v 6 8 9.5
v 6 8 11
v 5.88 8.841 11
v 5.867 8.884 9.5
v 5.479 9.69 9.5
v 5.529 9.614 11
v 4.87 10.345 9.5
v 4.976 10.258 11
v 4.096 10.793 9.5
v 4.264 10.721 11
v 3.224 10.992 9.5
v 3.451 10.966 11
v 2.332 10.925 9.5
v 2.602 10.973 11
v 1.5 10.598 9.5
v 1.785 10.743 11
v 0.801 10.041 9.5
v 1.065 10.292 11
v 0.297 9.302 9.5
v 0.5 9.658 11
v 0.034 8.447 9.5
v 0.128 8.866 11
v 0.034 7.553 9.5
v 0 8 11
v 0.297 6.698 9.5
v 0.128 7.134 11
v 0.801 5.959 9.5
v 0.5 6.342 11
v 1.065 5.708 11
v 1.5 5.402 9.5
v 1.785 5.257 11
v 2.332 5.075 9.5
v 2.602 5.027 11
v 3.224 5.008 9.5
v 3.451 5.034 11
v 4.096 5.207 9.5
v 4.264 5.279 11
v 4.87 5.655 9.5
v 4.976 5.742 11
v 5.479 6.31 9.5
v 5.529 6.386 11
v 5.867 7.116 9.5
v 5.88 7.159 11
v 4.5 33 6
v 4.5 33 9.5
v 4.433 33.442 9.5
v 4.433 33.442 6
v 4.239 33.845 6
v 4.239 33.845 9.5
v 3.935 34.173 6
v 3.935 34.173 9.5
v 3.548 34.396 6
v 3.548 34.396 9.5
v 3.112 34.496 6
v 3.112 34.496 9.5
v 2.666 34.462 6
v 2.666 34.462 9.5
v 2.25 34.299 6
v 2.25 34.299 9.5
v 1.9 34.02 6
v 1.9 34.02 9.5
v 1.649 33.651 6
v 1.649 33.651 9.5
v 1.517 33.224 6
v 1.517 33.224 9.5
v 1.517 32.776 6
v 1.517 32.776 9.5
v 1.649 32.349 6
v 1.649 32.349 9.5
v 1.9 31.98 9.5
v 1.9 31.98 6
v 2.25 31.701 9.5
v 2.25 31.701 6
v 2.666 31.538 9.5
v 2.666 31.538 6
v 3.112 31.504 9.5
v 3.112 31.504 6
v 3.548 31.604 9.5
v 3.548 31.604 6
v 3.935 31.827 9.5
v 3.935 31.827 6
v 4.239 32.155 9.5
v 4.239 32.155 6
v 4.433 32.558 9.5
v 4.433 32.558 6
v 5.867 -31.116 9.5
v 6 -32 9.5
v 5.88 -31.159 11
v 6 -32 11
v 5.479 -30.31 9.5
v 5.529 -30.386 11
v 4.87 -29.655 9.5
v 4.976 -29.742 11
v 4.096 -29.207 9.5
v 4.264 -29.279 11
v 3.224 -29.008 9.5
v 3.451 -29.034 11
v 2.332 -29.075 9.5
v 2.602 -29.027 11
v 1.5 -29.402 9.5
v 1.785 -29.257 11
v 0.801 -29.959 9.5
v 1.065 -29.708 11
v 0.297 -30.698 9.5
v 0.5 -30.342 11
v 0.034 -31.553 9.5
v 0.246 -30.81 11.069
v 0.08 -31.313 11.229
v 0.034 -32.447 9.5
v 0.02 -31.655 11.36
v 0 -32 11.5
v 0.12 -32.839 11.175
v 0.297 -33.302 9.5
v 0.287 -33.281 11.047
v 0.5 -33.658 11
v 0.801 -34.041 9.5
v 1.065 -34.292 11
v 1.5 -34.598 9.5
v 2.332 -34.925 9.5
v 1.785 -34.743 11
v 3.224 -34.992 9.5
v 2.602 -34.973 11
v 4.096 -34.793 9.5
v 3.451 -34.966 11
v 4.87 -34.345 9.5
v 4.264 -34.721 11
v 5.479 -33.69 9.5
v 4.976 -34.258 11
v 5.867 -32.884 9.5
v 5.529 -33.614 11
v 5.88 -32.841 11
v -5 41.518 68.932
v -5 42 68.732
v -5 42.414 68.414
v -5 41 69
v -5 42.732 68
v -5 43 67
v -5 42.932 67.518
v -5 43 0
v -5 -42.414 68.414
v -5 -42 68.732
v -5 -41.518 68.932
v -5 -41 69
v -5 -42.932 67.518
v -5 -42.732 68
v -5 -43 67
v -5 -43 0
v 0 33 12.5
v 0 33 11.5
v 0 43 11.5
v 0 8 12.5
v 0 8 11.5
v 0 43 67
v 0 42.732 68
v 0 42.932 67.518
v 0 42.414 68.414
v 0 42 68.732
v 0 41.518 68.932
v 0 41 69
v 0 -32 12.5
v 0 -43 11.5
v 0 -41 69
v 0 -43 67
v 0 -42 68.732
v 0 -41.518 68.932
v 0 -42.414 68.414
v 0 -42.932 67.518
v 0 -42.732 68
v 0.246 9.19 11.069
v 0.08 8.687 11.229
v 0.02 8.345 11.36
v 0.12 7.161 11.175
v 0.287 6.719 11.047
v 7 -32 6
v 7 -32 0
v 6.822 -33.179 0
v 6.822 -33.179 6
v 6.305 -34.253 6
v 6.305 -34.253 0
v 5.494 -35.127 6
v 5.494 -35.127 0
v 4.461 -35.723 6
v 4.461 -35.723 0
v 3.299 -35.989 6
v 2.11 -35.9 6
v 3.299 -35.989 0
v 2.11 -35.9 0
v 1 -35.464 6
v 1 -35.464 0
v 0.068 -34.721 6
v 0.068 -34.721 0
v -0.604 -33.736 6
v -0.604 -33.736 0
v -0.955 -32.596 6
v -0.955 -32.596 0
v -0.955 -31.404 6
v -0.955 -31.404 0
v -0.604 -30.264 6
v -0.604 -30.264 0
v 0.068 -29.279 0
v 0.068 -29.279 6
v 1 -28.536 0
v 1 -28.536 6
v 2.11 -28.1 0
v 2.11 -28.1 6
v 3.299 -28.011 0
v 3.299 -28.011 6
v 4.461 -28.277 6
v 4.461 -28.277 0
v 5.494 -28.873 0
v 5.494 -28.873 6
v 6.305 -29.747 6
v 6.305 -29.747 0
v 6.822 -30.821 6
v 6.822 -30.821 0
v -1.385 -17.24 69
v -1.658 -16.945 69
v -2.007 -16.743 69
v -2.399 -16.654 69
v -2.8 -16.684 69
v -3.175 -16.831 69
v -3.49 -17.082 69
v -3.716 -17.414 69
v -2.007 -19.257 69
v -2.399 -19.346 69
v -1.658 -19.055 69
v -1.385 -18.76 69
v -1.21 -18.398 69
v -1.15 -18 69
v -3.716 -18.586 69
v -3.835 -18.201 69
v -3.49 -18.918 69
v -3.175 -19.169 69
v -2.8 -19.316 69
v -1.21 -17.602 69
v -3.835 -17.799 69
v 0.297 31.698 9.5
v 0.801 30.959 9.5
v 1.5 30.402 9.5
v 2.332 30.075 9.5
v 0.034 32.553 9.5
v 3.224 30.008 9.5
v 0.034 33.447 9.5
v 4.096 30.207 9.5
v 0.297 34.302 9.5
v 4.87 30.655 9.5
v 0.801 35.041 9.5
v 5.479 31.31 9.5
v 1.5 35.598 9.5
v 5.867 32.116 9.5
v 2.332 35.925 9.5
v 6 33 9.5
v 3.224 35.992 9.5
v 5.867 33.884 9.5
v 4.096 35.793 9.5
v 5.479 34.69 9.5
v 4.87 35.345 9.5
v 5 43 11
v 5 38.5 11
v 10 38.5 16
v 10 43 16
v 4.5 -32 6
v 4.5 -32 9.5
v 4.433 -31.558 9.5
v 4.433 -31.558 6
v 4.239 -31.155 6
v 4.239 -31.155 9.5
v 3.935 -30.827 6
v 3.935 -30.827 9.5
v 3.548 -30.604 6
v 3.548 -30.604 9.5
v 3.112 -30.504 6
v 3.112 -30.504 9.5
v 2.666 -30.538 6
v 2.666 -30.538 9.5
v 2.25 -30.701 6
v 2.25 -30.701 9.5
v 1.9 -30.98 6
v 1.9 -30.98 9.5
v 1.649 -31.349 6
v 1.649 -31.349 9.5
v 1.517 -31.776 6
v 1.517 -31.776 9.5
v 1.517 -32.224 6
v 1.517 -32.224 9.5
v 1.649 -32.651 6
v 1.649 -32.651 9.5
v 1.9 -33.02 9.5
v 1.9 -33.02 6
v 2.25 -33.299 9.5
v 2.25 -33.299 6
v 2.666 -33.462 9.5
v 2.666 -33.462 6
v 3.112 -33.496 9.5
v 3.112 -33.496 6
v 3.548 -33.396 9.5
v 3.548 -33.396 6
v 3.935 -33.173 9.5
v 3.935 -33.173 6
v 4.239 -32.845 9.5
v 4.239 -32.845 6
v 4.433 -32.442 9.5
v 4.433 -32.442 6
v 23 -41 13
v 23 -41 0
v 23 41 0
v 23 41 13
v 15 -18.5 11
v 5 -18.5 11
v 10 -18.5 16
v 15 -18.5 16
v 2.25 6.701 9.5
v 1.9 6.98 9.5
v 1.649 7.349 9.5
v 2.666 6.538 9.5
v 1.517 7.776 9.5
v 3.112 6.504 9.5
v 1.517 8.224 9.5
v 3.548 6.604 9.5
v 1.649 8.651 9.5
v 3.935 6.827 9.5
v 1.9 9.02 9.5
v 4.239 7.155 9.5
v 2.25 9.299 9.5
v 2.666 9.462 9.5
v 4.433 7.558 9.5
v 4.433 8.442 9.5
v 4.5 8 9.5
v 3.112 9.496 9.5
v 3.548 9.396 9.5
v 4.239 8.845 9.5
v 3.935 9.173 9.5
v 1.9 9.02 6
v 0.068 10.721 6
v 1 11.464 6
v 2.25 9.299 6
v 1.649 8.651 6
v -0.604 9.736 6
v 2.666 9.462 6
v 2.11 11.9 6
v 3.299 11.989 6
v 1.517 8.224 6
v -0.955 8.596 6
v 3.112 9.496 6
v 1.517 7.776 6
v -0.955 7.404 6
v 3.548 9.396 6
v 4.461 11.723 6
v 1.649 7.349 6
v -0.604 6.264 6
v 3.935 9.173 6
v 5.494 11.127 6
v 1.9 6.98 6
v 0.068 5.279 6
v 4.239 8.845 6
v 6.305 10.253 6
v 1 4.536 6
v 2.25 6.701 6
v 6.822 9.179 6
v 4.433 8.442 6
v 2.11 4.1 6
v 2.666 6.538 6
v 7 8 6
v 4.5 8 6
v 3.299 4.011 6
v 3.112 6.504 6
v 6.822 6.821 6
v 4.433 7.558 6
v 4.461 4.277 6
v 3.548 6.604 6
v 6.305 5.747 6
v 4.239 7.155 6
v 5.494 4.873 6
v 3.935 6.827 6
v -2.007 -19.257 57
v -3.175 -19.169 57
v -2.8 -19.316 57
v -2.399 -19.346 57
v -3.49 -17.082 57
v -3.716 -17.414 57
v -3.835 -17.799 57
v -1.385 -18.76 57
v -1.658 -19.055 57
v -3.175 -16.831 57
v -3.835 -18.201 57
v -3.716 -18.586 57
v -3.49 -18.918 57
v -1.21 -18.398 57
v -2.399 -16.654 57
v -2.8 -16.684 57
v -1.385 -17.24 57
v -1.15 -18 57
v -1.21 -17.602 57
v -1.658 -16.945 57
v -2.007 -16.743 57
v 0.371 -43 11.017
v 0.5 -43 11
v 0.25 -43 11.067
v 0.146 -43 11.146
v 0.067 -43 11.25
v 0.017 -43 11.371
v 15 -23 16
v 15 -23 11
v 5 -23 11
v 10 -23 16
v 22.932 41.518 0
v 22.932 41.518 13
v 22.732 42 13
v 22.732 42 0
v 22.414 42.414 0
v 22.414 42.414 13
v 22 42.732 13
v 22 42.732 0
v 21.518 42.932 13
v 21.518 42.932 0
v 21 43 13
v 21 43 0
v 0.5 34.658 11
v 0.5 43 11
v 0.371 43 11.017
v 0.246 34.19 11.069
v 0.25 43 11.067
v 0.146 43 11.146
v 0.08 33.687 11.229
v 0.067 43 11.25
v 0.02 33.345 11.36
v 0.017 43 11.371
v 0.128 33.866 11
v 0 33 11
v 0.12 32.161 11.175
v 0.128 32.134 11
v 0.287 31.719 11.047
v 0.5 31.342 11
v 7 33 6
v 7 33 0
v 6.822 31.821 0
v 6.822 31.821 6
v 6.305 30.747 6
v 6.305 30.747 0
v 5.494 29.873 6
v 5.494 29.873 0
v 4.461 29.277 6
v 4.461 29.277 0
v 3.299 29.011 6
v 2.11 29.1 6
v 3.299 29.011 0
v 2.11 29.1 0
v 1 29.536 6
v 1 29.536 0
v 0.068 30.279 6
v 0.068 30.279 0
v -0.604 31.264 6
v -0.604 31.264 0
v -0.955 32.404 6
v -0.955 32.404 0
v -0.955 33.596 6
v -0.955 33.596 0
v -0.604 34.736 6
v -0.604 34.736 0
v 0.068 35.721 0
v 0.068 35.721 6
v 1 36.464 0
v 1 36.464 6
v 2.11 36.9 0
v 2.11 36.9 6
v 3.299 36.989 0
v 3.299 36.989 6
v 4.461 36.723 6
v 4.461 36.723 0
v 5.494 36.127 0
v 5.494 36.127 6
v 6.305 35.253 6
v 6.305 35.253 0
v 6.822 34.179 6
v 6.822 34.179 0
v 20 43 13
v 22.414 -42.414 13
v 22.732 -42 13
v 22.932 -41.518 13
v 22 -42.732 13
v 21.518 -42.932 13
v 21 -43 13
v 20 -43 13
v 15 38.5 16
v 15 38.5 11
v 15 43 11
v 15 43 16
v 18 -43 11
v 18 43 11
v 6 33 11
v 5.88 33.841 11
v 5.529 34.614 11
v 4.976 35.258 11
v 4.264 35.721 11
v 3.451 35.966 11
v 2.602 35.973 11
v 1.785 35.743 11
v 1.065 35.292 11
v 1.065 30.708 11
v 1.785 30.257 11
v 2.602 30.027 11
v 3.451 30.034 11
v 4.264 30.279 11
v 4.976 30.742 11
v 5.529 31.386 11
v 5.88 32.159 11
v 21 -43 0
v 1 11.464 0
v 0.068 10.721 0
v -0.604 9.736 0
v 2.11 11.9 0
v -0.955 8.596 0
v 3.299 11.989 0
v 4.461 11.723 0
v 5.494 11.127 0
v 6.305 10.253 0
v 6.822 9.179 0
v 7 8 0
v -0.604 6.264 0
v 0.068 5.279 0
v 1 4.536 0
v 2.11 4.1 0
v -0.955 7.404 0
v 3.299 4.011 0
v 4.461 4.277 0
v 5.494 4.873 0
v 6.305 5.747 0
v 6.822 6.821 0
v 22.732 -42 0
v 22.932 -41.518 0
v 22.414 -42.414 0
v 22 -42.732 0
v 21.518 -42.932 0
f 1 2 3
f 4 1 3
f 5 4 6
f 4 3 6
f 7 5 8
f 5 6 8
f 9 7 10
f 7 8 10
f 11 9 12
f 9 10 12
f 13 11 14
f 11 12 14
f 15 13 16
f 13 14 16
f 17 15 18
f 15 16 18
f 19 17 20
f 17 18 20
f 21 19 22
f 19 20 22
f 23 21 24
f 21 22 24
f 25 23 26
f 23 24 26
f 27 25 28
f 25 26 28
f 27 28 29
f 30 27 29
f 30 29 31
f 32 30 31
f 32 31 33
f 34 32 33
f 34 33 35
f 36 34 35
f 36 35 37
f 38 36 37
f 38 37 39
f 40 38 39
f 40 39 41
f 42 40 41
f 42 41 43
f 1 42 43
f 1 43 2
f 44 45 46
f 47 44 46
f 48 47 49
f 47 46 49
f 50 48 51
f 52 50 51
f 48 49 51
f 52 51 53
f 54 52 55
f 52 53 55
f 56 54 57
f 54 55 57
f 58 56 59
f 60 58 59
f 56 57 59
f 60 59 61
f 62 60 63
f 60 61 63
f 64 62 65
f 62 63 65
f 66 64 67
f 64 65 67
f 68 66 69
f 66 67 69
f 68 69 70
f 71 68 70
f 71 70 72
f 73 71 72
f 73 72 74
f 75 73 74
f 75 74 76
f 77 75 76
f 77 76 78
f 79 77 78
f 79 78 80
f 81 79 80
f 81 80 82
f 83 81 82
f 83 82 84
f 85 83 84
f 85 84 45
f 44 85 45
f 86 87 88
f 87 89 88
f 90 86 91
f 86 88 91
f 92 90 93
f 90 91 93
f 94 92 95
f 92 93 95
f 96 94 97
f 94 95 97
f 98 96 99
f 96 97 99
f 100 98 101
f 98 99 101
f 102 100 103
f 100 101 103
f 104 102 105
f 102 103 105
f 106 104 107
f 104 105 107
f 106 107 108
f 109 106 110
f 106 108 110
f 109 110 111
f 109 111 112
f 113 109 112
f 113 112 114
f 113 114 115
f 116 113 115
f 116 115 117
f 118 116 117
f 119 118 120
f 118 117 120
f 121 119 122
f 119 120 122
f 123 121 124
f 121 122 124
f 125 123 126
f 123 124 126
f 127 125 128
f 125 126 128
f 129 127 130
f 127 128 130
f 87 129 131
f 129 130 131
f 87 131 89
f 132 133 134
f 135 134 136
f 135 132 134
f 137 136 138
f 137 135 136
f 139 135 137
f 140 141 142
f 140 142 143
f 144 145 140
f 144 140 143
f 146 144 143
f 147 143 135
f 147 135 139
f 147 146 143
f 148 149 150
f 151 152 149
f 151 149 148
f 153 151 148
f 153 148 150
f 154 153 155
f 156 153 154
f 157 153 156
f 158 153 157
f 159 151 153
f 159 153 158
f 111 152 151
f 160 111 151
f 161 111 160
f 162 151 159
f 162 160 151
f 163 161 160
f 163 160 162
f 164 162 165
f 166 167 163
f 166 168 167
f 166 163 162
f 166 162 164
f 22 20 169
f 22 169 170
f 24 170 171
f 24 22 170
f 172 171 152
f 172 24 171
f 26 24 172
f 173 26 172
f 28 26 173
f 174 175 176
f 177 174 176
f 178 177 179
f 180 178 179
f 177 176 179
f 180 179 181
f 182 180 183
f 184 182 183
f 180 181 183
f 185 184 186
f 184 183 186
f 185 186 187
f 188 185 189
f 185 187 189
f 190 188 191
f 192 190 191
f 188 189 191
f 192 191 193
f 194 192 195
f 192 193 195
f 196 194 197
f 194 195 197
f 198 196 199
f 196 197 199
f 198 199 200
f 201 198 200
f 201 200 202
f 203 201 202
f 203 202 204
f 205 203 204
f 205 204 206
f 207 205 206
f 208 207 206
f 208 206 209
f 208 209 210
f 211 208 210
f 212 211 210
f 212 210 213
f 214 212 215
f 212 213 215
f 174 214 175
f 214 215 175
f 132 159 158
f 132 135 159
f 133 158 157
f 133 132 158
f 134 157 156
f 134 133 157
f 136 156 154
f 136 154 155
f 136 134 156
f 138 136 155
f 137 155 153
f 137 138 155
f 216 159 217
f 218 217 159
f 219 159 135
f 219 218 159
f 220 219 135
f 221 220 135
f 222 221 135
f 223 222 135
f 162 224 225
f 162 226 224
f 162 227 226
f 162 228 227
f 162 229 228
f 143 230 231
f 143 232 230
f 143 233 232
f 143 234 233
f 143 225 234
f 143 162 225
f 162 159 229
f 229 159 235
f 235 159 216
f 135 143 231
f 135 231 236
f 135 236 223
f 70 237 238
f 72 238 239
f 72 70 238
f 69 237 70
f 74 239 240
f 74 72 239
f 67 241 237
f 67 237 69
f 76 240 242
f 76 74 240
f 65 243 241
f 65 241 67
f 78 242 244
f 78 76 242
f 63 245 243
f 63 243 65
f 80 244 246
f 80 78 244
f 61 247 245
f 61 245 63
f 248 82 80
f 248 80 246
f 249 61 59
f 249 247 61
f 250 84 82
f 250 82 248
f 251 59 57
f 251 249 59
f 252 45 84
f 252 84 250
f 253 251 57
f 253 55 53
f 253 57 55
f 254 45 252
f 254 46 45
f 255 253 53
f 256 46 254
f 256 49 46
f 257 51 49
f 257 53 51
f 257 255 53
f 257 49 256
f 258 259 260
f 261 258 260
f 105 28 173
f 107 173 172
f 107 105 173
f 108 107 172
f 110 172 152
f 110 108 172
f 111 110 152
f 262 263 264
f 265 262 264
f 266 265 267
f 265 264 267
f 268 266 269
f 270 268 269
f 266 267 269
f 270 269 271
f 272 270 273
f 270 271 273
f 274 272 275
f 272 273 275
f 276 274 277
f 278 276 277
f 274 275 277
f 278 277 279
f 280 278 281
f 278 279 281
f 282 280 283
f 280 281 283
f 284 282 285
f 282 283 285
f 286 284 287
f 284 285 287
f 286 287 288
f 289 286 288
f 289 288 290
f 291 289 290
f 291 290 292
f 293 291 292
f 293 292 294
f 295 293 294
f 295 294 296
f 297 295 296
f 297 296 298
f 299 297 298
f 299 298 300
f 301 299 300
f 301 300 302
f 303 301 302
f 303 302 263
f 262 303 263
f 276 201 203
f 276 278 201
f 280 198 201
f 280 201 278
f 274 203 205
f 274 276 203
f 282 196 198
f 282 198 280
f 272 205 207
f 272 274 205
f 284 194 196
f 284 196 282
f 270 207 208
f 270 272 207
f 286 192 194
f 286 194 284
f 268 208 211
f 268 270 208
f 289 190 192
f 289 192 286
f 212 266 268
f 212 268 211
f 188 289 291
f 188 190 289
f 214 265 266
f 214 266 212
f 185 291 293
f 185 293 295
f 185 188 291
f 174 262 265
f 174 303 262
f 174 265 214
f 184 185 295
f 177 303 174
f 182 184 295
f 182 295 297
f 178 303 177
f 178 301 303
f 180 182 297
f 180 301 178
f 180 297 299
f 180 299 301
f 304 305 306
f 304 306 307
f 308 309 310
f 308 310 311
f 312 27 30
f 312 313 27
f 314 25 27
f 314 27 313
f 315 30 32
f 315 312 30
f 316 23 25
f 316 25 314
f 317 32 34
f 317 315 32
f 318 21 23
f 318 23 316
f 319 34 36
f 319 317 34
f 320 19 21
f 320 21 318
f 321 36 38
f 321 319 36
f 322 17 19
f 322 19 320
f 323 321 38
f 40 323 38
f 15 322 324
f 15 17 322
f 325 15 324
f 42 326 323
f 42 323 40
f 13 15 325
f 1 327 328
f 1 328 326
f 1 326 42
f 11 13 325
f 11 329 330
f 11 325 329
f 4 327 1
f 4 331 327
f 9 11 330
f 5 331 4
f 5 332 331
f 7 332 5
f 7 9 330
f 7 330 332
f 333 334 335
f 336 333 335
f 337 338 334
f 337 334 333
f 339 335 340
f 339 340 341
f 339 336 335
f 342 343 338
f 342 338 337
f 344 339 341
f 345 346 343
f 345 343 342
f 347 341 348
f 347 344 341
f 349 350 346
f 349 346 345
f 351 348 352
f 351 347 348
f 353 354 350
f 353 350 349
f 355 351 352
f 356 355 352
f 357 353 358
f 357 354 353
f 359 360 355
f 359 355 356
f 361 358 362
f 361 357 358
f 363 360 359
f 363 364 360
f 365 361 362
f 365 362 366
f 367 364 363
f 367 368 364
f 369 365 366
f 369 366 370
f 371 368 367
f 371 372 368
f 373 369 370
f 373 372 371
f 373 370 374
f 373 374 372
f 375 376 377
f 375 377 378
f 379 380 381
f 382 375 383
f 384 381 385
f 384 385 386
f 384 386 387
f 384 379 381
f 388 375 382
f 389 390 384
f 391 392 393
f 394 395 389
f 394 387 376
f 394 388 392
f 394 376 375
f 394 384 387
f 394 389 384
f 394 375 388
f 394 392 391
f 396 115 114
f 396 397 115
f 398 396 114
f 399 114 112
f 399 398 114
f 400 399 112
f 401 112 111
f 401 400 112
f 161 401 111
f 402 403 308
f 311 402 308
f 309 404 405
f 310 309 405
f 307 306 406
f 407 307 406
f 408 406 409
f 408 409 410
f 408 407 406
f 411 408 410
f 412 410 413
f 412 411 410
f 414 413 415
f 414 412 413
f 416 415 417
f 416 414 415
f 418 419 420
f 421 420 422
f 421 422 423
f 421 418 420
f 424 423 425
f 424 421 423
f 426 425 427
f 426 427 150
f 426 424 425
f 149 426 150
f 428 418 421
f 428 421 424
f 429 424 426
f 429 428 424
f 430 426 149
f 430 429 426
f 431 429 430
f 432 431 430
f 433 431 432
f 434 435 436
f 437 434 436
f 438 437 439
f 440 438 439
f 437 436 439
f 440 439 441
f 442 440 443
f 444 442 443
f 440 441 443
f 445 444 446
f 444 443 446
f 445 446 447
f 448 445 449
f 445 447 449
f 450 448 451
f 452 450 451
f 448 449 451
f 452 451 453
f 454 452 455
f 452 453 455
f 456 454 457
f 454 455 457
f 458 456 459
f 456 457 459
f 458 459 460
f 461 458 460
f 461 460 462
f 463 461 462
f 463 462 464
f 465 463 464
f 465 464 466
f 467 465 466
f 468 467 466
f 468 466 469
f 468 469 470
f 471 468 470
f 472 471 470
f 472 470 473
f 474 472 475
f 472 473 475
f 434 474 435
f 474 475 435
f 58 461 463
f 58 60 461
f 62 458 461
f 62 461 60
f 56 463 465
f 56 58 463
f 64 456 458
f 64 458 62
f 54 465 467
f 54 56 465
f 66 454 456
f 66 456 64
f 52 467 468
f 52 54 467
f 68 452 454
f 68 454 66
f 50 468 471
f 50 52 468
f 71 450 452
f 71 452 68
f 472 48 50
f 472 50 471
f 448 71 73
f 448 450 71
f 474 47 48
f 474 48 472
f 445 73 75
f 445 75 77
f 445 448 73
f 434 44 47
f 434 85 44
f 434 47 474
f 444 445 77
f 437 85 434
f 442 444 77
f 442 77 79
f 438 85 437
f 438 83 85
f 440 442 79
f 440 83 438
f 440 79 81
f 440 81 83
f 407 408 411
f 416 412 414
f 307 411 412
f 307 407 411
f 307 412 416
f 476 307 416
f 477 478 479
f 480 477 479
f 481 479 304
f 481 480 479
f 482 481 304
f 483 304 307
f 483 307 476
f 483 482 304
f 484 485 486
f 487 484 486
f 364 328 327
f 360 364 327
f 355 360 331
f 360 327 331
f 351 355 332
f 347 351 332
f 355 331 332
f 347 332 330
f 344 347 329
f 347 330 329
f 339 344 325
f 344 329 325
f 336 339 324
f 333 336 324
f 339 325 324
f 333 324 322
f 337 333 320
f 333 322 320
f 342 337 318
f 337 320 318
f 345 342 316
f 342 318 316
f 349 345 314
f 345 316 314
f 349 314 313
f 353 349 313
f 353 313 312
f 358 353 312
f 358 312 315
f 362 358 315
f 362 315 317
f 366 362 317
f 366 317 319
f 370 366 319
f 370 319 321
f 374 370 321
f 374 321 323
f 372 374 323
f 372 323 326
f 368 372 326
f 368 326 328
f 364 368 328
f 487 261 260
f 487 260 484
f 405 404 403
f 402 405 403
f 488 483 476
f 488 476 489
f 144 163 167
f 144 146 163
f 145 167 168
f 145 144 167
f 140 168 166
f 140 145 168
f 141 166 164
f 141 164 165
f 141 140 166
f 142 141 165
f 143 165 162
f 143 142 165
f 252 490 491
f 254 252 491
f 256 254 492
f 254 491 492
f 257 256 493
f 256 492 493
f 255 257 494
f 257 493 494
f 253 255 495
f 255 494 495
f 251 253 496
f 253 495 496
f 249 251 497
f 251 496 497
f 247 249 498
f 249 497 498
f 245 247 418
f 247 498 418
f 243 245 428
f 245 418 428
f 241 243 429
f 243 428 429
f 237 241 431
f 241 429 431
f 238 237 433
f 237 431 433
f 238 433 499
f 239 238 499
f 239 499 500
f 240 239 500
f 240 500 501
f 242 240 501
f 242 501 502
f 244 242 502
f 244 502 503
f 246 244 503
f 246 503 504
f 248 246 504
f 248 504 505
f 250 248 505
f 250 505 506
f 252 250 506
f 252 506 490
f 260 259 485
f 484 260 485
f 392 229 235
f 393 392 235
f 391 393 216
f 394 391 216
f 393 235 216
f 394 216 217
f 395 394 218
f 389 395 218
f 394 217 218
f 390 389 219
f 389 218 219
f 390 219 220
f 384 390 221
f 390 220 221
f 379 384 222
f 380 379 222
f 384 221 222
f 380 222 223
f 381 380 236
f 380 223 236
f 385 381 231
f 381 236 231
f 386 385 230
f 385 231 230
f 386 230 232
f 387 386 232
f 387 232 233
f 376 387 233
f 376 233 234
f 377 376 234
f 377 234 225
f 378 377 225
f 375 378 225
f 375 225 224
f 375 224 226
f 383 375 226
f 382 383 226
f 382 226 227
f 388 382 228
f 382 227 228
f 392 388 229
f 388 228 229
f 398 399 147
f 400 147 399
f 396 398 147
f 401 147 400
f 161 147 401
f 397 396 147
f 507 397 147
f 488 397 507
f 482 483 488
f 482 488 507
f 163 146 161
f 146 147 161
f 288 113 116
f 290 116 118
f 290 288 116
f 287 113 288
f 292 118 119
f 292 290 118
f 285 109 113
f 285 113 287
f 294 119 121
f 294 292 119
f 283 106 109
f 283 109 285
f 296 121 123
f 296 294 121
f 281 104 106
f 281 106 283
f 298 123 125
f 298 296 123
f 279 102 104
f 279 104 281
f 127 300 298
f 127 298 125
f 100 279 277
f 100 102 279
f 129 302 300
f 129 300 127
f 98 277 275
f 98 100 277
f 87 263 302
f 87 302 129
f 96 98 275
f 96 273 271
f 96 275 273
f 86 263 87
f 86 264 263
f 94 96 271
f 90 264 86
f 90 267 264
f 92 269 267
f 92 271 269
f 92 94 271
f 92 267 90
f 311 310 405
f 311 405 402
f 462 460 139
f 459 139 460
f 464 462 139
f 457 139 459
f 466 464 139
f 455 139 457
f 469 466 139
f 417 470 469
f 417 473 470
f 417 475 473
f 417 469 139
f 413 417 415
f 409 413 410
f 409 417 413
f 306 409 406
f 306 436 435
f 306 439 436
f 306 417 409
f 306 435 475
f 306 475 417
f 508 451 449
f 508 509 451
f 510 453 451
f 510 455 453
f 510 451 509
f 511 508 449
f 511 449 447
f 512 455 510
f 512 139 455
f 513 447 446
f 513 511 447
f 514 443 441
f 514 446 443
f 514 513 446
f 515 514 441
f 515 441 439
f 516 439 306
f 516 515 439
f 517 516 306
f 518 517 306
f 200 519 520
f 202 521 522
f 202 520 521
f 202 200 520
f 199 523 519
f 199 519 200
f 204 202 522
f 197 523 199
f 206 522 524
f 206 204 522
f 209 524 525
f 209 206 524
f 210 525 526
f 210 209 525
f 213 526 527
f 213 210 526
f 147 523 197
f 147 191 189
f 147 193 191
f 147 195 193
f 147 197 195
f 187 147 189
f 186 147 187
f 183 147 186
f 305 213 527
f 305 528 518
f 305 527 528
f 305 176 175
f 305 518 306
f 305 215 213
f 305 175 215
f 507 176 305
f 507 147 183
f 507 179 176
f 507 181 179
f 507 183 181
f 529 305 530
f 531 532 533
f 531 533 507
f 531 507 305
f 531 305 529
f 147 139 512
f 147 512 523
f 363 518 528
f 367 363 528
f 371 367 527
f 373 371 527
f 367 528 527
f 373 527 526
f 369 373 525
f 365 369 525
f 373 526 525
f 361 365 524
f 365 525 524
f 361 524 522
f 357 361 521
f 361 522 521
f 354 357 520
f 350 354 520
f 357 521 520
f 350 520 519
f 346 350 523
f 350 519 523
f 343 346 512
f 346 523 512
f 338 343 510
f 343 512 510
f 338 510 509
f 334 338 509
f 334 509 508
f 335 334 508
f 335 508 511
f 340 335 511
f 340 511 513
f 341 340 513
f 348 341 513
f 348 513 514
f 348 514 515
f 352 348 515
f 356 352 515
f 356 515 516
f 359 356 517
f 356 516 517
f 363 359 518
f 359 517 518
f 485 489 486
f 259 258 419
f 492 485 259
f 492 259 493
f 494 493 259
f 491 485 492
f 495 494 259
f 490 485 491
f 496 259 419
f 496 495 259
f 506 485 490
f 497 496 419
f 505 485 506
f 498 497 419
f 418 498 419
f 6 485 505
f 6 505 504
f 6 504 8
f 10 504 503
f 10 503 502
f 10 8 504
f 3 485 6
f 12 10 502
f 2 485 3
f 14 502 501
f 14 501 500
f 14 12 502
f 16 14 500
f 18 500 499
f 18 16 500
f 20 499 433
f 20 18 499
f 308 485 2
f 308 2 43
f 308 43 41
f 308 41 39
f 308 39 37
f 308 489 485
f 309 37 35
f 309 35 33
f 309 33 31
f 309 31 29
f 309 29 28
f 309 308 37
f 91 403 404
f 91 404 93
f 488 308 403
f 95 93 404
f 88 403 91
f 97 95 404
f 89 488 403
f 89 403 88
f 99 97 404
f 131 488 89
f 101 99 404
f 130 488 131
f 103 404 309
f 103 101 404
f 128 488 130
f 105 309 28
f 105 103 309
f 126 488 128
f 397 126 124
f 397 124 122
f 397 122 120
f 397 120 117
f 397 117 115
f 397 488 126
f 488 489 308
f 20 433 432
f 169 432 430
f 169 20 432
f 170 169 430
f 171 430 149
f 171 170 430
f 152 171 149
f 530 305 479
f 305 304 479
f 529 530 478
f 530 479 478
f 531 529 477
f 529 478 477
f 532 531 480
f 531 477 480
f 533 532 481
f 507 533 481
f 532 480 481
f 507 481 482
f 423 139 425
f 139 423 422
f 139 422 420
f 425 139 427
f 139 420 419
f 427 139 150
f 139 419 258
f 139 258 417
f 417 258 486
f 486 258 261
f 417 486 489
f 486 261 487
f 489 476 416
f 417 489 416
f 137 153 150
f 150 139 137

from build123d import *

# Parameters (mm, degrees)
F1_DEPTH  = 43
F2_R      = 4
F3_DEPTH  = 6
F4_R      = 1.5
F5_DEPTH  = 25
F4_R_2    = 3
F6_DEPTH  = 1.5
F7_W      = 10
F7_H      = 4.5
F8_DEPTH  = 5
F10_DEPTH = 50
F11_R     = 2
F13_R     = 1.35
F14_DEPTH = 12


with BuildPart() as f1:
    # F0 (on Front) → F1 (new body, symmetric)
    with BuildSketch(Plane.XZ):
        with BuildLine():
            Line((0, 11.5), (0, 69))
            Line((0, 69), (-5, 69))
            Line((-5, 69), (-5, 0))
            Line((-5, 0), (23, 0))
            Line((23, 0), (23, 13))
            Line((23, 13), (20, 13))
            Line((20, 13), (18, 11))
            Line((18, 11), (0.5, 11))
            ThreePointArc((0.5, 11), (0.146447, 11.146447), (0, 11.5))
        make_face()
    extrude(amount=F1_DEPTH, both=True)

    # F2 (on face) → F3 (cut)
    with BuildSketch(Plane(origin=(0, 0, 0), x_dir=(1, 0, 0), z_dir=(0, 0, -1))):
        with Locations((3, -33)):
            Circle(F2_R)
        with Locations((3, -8)):
            Circle(F2_R)
        with Locations((3, 32)):
            Circle(F2_R)
    extrude(amount=-F3_DEPTH, mode=Mode.SUBTRACT)

    # F4 (on face) → F5 (cut)
    with BuildSketch(Plane.XY.offset(11)):
        with Locations((3, 33)):
            Circle(F4_R)
        with Locations((3, 8)):
            Circle(F4_R)
        with Locations((3, -32)):
            Circle(F4_R)
    extrude(amount=-F5_DEPTH, mode=Mode.SUBTRACT)

    # F4 (on face) → F6 (cut, symmetric)
    with BuildSketch(Plane.XY.offset(11)):
        with Locations((3, 8)):
            Circle(F4_R_2)
        with Locations((3, 8)):
            Circle(F4_R, mode=Mode.SUBTRACT)
        with Locations((3, 33)):
            Circle(F4_R_2)
        with Locations((3, 33)):
            Circle(F4_R, mode=Mode.SUBTRACT)
        with Locations((3, -32)):
            Circle(F4_R_2)
        with Locations((3, -32)):
            Circle(F4_R, mode=Mode.SUBTRACT)
    extrude(amount=F6_DEPTH, both=True, mode=Mode.SUBTRACT)

    # F7 (on face) → F8 (join)
    with BuildSketch(Plane.XY.offset(11)):
        with Locations((10, 40.75)):
            Rectangle(F7_W, F7_H)
        with Locations((10, -20.75)):
            Rectangle(F7_W, F7_H)
    extrude(amount=F8_DEPTH)

    # F9 (on Front) → F10 (cut, symmetric)
    with BuildSketch(Plane.XZ):
        Polygon((5, 19), (5, 11), (13, 19), align=None)
    extrude(amount=F10_DEPTH, both=True, mode=Mode.SUBTRACT)

    # F11
    f11_edges = [f1.edges().sort_by_distance(p)[0] for p in [
        (23, -43, 6.5),
        (23, 43, 6.5),
        (-2.5, -43, 69),
        (-2.5, 43, 69),
    ]]
    fillet(f11_edges, radius=F11_R)

    # F13 (on face) → F14 (cut)
    with BuildSketch(Plane.XY.offset(69)):
        with Locations((-2.5, -18)):
            Circle(F13_R)
    extrude(amount=-F14_DEPTH, mode=Mode.SUBTRACT)


solid = f1.part
